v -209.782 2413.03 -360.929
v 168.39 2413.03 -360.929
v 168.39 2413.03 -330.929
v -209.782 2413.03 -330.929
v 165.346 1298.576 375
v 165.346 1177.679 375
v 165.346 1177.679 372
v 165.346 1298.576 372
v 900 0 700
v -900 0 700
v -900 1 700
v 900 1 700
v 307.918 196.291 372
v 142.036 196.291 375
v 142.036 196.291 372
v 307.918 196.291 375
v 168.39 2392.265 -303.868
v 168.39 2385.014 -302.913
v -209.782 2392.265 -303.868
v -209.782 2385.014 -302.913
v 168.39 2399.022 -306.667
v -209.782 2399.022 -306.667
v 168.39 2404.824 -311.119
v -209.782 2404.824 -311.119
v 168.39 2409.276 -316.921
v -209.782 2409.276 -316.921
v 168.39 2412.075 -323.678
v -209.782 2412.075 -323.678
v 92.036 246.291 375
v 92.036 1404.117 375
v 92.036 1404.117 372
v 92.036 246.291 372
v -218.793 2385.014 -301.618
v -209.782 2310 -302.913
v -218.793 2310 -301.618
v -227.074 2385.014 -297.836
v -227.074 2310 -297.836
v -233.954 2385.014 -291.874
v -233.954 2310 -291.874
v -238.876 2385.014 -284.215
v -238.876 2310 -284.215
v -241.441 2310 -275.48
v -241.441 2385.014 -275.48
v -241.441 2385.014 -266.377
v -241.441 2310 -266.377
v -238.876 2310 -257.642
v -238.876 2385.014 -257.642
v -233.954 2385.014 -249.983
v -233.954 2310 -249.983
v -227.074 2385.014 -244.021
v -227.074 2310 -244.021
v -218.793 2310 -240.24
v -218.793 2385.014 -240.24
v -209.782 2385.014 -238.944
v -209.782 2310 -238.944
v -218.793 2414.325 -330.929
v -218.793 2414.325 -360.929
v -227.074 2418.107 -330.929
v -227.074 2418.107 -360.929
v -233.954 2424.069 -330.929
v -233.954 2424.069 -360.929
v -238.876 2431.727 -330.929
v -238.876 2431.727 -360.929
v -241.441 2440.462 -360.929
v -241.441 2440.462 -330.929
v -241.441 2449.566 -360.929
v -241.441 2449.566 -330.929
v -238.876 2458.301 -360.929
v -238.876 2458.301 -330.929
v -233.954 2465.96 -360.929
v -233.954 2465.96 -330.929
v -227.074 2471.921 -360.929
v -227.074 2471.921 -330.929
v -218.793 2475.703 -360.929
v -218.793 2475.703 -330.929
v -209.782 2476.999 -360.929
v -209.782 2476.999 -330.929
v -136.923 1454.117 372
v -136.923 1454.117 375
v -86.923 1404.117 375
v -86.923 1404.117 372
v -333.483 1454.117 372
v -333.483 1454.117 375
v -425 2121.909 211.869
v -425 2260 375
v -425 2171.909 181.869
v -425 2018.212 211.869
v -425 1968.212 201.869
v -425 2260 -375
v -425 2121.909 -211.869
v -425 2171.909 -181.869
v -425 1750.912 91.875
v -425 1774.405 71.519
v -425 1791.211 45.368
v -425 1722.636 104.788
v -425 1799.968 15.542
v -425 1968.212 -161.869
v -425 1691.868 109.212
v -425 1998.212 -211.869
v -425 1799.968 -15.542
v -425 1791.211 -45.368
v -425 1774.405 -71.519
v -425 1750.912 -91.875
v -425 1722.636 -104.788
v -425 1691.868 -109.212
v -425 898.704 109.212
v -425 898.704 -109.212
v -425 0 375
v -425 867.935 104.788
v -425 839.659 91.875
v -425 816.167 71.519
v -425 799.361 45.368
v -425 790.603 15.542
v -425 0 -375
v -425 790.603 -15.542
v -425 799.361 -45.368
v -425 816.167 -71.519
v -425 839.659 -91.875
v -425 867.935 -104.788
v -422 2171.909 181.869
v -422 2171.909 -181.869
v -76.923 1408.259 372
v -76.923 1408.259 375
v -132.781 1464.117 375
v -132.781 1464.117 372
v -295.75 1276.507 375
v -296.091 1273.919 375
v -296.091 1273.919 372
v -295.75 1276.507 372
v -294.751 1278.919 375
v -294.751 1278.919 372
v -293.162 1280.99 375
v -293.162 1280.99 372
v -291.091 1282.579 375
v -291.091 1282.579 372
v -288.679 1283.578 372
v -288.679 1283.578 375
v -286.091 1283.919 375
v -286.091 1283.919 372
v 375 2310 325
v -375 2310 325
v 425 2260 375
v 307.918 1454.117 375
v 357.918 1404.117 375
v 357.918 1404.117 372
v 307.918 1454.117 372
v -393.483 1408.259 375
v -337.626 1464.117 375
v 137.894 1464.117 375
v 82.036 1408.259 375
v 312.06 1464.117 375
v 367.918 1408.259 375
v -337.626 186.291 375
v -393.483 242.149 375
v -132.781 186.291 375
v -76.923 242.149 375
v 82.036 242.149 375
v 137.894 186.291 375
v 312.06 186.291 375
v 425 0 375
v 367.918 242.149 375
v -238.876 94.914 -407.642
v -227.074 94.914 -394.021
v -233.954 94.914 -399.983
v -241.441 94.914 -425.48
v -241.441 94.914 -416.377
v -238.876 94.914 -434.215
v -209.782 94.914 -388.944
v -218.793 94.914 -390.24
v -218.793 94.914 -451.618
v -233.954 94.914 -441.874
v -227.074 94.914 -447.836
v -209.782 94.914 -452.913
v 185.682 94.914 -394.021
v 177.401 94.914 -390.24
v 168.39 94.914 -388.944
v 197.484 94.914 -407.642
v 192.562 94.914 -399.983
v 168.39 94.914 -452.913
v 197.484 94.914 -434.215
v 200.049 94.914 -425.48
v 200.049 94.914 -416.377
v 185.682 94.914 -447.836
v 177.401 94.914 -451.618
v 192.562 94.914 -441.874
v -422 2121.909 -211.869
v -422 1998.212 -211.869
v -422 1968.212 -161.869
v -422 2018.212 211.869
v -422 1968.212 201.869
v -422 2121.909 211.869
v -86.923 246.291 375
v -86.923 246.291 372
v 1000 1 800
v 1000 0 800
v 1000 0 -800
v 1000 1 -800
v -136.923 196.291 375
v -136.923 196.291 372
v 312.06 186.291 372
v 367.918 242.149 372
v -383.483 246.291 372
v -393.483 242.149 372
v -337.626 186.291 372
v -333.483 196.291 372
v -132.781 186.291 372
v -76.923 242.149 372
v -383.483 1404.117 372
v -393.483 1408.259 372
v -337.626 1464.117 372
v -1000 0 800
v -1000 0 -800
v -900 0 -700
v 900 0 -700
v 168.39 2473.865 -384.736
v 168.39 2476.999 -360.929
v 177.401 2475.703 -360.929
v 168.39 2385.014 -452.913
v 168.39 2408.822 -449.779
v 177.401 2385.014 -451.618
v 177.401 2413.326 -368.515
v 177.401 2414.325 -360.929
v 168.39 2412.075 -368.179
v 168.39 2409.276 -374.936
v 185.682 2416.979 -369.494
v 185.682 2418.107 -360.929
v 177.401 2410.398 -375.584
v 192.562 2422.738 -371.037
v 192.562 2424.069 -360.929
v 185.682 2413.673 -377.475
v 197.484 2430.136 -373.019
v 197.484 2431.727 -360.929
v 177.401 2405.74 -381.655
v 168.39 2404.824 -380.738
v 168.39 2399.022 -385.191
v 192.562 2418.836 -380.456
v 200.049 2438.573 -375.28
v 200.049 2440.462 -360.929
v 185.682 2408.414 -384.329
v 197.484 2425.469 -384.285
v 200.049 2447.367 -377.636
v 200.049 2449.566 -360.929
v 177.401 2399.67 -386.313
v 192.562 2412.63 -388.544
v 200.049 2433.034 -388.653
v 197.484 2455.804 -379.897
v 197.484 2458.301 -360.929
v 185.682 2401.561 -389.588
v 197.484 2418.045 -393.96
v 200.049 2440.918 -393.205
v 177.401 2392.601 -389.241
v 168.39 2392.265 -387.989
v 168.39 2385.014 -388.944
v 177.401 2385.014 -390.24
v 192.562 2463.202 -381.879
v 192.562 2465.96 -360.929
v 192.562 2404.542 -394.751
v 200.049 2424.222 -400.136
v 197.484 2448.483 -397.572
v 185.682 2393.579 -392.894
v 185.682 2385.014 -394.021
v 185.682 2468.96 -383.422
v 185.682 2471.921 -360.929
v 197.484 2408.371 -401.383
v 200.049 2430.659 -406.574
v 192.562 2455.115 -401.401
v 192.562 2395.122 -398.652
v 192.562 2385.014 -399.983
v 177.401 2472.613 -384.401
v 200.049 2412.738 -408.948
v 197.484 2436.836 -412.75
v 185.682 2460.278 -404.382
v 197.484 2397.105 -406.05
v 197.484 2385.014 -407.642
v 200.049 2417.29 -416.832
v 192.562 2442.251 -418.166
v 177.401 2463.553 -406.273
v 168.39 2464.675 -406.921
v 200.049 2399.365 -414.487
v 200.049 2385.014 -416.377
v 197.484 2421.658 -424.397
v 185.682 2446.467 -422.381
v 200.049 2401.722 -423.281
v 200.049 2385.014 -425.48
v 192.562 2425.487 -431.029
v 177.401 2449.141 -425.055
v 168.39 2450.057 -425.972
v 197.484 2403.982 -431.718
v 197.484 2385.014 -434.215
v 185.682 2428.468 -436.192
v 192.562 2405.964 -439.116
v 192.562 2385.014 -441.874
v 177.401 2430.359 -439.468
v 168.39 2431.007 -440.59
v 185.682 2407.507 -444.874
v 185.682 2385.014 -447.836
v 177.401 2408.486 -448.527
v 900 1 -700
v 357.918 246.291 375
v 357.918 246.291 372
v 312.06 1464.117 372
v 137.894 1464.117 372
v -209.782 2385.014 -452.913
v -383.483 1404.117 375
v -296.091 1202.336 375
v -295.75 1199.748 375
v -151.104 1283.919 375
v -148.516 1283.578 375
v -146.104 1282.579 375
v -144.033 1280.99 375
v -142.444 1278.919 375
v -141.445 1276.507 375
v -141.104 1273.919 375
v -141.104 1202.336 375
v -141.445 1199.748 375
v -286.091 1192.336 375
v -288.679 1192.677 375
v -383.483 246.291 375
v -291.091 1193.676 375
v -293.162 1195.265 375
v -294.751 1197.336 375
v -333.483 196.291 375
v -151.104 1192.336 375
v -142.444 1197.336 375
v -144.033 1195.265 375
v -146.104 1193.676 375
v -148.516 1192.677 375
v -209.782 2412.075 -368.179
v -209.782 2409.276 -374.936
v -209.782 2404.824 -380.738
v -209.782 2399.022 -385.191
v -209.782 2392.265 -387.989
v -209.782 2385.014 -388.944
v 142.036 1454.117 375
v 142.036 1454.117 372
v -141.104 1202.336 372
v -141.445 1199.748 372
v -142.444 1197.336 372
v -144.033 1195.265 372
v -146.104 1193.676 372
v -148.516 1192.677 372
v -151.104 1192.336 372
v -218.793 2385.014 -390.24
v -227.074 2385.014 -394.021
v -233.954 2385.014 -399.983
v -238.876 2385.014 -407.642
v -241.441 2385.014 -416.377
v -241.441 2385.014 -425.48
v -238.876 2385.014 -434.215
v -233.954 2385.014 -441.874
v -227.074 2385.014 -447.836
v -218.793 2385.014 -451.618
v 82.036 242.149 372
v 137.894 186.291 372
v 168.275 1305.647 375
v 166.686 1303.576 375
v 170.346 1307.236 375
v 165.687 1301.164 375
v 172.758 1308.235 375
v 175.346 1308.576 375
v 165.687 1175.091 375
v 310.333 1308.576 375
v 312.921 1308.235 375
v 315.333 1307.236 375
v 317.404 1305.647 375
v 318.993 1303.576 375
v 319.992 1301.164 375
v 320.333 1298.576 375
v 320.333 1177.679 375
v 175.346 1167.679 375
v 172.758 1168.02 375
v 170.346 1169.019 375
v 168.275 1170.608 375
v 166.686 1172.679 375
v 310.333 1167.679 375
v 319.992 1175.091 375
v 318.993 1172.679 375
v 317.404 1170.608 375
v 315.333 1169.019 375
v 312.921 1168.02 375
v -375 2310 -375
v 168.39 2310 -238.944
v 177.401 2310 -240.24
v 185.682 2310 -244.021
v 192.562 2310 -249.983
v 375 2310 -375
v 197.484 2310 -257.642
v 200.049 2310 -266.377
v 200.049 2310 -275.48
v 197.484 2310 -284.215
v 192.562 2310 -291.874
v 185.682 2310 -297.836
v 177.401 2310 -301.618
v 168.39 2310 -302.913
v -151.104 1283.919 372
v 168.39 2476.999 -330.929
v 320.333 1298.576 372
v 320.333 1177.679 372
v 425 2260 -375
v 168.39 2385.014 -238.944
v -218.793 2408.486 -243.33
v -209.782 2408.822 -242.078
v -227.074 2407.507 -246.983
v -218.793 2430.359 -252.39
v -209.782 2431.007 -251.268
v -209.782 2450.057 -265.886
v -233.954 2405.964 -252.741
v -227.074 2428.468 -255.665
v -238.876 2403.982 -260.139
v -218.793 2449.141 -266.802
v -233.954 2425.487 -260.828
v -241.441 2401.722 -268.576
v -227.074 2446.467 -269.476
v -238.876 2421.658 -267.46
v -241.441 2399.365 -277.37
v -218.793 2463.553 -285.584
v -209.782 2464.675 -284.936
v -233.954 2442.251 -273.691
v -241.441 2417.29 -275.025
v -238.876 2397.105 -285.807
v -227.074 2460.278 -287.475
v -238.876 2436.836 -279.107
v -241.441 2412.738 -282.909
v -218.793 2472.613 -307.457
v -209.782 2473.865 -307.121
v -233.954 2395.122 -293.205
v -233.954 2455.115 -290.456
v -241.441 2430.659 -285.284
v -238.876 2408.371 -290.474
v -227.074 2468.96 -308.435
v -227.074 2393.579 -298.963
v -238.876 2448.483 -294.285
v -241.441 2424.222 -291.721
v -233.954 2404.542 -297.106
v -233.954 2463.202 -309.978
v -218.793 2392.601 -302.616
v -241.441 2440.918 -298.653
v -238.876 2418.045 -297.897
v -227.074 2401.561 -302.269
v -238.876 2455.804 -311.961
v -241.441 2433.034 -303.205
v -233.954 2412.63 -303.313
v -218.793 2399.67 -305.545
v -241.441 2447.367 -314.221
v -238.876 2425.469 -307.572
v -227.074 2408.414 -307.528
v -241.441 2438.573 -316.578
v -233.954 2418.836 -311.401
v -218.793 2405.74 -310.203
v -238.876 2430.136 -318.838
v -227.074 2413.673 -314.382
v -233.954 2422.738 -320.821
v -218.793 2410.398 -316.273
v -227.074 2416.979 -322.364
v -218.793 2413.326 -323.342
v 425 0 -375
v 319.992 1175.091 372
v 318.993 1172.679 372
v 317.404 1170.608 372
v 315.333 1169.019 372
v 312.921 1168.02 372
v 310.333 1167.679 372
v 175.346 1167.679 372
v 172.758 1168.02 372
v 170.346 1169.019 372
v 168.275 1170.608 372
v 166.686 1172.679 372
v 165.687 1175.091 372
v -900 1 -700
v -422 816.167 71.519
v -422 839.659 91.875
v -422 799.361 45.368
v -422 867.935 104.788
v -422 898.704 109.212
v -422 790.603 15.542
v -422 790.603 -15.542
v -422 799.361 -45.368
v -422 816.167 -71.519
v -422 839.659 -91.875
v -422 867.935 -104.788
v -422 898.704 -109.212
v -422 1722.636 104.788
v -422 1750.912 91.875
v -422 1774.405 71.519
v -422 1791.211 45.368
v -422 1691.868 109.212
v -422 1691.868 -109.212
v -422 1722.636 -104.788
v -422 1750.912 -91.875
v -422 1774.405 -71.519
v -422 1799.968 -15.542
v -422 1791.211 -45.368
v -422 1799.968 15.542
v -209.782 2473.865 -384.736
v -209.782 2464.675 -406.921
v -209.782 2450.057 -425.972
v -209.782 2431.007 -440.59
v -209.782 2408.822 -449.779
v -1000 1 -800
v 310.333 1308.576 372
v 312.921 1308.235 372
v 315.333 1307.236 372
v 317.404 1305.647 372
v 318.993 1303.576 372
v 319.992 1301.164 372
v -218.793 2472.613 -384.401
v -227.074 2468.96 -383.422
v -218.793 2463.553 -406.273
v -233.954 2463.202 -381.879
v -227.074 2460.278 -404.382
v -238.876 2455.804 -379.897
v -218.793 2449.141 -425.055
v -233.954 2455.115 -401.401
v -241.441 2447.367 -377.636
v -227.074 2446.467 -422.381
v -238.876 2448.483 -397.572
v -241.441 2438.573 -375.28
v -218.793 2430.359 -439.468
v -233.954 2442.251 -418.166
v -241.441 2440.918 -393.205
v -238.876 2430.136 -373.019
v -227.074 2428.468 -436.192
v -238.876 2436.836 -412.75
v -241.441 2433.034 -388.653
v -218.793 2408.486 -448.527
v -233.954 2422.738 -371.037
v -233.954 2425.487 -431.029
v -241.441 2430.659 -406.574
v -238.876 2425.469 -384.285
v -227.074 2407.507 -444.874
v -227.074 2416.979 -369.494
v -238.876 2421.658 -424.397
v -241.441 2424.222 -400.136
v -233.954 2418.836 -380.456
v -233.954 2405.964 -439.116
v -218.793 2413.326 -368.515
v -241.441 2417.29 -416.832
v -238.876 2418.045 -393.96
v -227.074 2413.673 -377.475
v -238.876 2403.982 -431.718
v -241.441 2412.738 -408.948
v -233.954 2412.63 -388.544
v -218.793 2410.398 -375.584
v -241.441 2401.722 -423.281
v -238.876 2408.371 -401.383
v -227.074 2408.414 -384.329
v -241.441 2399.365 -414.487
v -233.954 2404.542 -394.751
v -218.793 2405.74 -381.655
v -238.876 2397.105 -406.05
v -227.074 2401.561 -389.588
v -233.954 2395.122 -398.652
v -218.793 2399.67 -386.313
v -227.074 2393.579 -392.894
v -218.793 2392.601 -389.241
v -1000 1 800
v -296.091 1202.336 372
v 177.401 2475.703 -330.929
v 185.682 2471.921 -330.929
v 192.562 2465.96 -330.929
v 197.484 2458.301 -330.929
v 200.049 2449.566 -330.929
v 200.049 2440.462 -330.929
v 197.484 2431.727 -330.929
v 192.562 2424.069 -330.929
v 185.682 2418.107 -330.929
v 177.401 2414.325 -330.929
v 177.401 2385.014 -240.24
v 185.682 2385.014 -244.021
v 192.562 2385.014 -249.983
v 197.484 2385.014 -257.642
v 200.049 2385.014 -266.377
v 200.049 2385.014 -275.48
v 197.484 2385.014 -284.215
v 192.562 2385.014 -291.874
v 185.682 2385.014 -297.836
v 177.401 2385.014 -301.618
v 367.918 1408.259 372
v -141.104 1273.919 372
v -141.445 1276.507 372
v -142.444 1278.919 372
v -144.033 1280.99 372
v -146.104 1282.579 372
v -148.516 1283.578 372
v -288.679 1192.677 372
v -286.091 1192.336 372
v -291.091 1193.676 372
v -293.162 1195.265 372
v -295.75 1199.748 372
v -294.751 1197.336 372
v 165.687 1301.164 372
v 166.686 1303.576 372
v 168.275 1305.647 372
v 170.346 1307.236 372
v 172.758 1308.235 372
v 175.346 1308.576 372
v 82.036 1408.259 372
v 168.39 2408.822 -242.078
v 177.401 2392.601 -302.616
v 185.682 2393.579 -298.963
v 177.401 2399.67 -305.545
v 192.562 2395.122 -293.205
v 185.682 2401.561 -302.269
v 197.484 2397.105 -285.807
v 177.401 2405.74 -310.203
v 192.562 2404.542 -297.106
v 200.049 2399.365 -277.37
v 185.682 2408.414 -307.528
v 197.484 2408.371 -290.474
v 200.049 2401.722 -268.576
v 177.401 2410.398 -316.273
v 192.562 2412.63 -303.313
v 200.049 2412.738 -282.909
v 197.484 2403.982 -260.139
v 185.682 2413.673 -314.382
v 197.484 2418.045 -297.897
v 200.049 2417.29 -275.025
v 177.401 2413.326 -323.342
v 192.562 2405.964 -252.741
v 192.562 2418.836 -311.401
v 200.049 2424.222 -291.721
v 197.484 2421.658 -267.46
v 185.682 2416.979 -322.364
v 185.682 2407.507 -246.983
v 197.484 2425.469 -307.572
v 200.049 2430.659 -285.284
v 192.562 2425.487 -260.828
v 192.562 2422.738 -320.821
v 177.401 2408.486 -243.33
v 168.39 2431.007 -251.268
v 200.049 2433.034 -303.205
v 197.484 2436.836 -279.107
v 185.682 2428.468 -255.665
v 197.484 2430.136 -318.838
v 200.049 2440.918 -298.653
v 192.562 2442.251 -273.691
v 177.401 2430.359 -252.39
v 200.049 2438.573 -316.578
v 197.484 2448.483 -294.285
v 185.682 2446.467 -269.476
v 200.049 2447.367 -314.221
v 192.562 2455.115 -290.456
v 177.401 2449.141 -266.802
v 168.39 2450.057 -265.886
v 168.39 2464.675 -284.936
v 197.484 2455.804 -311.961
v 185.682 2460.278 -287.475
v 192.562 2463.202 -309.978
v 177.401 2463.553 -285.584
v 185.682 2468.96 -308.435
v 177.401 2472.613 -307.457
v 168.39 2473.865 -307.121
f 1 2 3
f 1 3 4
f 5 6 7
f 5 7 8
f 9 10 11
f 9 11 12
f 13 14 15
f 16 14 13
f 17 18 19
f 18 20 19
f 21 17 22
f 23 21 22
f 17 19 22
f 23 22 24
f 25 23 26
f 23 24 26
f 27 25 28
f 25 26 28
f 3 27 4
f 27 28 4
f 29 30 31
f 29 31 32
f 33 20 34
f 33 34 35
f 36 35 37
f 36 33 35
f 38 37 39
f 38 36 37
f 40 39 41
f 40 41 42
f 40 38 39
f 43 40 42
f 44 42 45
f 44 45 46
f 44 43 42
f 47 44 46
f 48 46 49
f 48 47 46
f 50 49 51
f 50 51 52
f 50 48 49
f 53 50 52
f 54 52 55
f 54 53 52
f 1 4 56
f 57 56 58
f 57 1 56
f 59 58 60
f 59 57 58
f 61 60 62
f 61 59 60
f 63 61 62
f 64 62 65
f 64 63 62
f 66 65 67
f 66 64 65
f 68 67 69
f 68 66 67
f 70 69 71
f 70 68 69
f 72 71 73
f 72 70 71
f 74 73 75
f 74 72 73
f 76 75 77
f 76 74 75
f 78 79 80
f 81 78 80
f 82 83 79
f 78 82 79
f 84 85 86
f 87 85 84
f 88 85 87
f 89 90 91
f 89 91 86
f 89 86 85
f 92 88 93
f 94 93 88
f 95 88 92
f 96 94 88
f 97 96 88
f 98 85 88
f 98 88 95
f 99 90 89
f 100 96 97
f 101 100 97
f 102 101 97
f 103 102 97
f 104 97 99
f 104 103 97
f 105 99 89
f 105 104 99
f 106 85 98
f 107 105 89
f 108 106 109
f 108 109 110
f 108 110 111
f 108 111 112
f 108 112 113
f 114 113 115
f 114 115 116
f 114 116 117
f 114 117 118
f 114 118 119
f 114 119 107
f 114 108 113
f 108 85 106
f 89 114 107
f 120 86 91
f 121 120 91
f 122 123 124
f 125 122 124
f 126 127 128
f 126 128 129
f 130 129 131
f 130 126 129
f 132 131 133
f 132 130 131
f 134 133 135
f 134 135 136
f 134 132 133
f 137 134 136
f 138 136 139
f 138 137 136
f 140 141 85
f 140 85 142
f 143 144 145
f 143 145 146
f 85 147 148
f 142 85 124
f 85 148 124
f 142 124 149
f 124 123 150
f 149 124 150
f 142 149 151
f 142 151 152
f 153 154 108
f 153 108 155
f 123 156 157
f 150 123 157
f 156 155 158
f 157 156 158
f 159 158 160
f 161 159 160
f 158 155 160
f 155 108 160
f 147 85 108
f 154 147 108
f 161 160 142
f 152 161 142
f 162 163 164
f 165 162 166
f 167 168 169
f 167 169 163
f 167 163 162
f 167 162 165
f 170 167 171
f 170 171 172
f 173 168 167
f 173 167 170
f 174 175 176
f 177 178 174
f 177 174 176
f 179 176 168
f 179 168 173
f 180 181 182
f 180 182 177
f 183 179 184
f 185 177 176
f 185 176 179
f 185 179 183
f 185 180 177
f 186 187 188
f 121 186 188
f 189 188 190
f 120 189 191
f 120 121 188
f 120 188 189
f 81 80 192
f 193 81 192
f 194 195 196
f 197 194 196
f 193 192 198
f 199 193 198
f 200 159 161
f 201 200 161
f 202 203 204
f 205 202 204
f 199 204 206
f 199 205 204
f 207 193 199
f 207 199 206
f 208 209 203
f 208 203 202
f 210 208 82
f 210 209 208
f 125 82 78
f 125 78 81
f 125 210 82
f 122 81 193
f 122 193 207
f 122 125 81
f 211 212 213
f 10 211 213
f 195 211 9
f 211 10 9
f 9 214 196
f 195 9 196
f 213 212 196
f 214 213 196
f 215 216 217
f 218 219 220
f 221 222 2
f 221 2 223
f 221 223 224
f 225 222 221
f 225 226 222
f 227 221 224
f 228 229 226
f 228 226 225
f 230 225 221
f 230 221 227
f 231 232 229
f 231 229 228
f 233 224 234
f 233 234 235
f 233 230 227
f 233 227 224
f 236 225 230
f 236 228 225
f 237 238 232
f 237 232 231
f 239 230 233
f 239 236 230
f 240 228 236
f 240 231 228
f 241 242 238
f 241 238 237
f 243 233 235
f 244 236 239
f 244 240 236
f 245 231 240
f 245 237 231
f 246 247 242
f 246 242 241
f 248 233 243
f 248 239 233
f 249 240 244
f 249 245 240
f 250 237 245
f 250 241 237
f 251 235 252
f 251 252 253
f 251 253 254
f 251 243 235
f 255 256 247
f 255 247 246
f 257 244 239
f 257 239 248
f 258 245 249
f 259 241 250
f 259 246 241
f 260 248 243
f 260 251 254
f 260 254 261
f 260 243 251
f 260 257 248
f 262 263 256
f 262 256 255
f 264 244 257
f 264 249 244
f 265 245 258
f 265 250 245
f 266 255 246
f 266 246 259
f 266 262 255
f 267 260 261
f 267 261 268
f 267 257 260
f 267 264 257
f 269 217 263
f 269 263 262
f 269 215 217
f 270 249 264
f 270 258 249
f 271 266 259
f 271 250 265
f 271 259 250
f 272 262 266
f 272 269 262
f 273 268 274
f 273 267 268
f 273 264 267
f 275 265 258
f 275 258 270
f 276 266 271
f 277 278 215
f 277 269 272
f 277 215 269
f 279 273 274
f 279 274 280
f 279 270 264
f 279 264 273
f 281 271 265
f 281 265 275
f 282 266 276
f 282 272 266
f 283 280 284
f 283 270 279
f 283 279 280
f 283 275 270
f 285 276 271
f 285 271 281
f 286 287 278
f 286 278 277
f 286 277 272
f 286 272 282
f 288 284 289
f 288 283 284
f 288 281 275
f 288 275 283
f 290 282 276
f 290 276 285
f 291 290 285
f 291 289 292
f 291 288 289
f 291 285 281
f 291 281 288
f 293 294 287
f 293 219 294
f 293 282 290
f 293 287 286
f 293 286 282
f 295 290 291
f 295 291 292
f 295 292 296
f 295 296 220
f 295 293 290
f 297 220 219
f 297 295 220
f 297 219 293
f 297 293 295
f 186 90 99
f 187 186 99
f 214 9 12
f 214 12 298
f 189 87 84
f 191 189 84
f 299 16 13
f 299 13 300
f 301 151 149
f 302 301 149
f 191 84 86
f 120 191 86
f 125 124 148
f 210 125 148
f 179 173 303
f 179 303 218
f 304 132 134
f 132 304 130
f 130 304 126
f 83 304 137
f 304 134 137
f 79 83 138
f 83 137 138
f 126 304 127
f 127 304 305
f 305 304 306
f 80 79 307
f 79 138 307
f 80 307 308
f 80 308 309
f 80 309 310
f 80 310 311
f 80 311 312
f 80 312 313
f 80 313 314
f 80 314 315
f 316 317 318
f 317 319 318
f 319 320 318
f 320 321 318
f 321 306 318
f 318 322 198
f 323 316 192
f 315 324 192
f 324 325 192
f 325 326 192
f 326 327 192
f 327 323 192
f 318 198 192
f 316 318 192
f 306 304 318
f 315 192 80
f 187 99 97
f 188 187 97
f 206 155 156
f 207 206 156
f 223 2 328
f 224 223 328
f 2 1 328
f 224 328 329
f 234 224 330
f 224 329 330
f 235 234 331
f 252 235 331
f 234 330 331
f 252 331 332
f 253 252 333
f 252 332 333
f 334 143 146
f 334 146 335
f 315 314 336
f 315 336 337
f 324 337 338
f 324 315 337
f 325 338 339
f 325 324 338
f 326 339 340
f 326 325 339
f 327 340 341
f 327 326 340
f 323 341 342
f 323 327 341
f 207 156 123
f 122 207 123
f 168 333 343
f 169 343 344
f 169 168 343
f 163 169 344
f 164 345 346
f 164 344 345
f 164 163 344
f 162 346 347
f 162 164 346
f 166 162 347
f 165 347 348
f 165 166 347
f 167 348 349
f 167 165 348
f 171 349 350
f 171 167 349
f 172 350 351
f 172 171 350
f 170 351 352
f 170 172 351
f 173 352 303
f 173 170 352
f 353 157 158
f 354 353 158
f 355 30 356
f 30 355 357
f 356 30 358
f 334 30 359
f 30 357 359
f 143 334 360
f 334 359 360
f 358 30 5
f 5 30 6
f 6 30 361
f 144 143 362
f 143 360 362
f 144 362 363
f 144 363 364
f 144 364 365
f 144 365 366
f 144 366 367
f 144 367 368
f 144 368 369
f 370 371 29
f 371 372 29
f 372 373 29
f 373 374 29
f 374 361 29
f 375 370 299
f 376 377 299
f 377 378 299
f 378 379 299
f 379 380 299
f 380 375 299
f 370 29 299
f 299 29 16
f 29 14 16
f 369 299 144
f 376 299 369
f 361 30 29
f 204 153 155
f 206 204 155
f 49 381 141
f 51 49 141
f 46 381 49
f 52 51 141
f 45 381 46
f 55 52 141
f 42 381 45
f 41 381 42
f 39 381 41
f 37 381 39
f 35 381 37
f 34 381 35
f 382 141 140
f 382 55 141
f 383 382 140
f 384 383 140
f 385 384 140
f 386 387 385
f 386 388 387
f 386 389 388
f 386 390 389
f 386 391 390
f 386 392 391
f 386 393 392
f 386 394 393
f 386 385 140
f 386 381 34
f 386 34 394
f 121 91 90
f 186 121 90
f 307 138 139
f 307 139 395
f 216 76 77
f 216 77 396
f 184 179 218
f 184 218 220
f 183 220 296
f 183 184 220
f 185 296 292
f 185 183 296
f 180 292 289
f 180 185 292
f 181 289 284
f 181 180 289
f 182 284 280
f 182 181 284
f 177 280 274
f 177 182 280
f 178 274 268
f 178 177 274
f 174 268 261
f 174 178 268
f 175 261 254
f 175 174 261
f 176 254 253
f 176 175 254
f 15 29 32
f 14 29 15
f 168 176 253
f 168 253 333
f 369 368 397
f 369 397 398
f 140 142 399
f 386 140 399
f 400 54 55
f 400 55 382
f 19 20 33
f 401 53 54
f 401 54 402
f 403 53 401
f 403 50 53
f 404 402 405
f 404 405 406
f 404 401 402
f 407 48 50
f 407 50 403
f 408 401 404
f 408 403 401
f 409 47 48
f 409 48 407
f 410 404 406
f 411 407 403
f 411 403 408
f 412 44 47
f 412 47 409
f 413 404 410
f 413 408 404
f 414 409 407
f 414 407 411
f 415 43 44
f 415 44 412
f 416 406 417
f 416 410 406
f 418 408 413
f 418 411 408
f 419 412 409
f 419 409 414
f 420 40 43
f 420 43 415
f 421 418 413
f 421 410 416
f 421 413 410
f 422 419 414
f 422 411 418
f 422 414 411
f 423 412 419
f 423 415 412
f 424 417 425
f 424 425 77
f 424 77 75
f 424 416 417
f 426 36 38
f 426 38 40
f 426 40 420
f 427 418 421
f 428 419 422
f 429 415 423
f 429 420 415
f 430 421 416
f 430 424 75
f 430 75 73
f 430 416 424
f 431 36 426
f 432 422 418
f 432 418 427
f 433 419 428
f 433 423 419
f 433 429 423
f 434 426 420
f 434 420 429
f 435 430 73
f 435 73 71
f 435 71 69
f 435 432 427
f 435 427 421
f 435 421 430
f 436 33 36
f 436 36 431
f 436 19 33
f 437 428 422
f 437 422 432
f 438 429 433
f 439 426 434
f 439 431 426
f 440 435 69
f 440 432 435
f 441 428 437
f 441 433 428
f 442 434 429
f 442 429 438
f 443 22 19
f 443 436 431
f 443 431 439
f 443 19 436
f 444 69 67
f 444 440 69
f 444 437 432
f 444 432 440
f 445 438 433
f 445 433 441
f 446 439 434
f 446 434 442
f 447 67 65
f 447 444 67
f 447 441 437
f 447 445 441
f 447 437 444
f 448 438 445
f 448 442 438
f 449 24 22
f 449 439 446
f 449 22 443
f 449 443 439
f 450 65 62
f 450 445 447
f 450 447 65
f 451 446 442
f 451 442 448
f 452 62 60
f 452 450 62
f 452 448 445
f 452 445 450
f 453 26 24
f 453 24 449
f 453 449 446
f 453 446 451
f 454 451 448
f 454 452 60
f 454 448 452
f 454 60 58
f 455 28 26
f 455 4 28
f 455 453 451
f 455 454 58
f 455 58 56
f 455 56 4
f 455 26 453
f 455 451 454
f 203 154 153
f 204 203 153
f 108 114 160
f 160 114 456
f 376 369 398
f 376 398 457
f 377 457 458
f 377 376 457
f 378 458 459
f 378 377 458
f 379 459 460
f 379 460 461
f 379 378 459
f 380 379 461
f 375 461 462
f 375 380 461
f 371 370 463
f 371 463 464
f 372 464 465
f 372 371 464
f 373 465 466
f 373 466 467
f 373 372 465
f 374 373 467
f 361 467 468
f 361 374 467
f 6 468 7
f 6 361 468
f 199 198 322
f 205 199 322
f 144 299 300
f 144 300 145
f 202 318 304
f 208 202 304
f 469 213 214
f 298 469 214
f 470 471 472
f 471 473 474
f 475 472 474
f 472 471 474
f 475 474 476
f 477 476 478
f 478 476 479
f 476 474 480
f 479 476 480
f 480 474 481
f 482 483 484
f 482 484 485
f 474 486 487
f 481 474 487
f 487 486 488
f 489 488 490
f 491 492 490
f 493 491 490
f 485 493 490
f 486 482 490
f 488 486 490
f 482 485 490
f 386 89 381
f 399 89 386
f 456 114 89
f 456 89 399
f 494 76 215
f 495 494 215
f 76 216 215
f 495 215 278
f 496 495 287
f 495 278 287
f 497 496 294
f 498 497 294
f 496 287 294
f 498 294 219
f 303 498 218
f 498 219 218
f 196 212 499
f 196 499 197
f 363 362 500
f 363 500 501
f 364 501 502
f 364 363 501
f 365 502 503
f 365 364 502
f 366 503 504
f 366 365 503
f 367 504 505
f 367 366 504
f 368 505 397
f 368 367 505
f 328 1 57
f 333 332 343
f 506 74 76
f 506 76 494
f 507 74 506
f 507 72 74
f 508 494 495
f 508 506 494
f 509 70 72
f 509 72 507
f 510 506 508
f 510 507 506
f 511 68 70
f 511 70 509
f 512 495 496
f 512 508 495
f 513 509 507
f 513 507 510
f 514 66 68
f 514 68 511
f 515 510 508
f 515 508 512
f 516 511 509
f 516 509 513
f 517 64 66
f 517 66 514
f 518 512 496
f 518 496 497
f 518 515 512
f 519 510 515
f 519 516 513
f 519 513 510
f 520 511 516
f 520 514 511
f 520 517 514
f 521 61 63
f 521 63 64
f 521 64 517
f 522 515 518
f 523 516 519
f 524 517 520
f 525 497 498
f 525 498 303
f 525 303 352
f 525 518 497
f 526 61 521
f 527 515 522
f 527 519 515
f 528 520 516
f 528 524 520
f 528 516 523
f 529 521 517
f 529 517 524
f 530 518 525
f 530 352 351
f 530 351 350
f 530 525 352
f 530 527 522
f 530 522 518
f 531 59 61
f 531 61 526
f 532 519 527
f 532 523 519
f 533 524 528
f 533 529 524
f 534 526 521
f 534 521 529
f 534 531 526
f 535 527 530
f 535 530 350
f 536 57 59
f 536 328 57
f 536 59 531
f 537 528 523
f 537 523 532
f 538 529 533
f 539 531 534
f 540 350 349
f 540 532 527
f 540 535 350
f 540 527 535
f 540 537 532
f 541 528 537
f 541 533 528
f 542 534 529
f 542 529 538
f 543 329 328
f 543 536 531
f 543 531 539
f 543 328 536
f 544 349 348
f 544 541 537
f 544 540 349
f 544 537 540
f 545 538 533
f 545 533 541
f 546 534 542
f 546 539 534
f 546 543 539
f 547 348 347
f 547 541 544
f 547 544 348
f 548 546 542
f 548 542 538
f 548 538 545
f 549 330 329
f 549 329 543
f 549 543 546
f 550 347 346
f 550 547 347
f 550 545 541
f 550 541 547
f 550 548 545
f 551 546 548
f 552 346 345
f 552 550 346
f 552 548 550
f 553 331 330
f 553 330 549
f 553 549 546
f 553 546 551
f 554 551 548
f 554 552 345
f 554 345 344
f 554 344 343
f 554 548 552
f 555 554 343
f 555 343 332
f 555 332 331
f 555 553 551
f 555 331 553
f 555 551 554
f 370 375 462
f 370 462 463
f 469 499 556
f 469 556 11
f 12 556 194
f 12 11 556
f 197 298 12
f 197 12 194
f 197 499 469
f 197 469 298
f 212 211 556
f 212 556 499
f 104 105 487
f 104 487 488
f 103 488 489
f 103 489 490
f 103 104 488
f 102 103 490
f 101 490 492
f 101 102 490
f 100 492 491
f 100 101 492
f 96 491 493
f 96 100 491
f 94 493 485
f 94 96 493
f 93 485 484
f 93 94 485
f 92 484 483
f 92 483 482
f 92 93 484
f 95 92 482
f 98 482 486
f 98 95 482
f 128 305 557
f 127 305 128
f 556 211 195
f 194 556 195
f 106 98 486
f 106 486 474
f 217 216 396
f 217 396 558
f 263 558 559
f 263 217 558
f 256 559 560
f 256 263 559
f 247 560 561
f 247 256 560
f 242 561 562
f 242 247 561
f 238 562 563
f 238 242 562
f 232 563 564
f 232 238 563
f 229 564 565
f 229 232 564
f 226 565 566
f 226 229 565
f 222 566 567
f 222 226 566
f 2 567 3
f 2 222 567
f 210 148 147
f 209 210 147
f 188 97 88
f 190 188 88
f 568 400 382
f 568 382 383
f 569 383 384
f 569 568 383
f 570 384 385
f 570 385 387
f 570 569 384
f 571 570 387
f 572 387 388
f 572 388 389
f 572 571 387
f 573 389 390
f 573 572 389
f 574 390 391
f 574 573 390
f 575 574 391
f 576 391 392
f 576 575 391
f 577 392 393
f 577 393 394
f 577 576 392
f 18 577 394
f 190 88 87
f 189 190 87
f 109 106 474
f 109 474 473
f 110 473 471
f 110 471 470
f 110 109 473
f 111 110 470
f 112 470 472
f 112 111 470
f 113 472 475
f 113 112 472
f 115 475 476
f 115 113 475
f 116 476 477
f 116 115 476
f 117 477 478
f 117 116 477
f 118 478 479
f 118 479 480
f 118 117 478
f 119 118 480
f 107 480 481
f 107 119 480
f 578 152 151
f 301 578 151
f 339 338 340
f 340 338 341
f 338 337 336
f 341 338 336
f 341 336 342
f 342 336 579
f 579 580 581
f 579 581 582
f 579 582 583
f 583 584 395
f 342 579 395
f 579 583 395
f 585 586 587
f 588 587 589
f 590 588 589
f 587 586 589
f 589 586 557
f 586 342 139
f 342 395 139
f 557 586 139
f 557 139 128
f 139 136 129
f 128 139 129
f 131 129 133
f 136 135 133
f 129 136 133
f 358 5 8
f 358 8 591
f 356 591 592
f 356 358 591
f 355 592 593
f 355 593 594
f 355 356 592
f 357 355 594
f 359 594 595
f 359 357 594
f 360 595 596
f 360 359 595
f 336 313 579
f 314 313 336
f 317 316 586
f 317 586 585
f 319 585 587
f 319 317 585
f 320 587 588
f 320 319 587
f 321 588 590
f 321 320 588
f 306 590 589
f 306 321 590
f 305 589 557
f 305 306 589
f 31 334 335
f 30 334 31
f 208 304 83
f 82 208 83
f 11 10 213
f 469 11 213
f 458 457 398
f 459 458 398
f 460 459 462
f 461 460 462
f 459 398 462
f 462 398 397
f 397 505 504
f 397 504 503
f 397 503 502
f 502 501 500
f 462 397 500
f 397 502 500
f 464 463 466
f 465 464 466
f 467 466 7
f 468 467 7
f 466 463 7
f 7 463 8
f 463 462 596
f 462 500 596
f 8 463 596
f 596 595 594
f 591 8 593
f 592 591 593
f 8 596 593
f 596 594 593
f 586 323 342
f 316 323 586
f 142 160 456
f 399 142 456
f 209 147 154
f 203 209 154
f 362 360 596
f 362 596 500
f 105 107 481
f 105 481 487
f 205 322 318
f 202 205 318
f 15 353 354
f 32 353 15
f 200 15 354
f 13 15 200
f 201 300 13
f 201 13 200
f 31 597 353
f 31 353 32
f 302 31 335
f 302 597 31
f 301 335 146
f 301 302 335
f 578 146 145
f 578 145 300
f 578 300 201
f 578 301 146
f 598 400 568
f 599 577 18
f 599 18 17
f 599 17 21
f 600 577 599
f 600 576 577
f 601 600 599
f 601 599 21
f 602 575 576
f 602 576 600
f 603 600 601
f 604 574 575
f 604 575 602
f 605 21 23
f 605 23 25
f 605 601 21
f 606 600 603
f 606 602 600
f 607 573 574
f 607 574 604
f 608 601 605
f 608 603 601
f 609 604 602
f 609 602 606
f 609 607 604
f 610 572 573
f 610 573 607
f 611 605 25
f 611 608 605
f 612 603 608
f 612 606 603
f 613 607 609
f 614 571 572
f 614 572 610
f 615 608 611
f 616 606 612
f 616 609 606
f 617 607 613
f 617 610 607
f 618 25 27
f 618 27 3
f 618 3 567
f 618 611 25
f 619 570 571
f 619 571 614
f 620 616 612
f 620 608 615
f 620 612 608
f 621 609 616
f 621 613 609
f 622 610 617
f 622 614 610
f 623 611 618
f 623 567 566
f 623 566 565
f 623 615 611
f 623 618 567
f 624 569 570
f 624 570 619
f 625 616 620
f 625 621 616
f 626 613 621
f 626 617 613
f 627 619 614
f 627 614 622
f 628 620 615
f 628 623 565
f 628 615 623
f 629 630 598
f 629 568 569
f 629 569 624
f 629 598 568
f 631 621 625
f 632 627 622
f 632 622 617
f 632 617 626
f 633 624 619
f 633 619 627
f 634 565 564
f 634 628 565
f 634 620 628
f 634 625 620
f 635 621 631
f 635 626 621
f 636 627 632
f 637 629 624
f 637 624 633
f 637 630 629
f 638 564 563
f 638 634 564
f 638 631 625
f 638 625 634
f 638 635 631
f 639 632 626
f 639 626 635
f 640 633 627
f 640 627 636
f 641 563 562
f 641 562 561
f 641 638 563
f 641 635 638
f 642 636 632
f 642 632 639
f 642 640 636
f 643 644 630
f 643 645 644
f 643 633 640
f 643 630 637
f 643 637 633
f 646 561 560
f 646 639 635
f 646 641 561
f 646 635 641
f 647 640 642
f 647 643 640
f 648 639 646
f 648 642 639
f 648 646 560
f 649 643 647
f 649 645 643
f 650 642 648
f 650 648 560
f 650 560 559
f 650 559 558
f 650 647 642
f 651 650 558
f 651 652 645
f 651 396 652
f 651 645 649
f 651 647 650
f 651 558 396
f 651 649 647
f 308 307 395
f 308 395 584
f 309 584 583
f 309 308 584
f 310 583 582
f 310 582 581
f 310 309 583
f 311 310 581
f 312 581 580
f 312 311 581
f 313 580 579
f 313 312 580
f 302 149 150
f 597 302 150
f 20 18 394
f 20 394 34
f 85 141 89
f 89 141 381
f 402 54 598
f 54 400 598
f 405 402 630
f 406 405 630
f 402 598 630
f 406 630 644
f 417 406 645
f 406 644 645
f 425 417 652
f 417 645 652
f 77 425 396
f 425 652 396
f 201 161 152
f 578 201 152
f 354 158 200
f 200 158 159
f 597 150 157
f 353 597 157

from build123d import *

# Parameters (mm, degrees)
CROQUIS1_W              = 850
CROQUIS1_H              = 750
SALIENTE_EXTRUIR1_DEPTH = 2310
CORTAR_EXTRUIR1_DEPTH   = 3
CORTAR_EXTRUIR2_DEPTH   = 3
CORTAR_EXTRUIR3_DEPTH   = 3
CORTAR_EXTRUIR4_DEPTH   = 3
CHAFL_N1_SIZE           = 50
CROQUIS7_W              = 2000
CROQUIS7_H              = 1600
CROQUIS7_W_2            = 1800
CROQUIS7_H_2            = 1400
SALIENTE_EXTRUIR2_DEPTH = 1


with BuildPart() as part:
    # Croquis1 → Saliente-Extruir1 (new body)
    with BuildSketch(Plane(origin=(0, 0, 0), x_dir=(1, 0, 0), z_dir=(0, 1, 0))):
        Rectangle(CROQUIS1_W, CROQUIS1_H)
    extrude(amount=SALIENTE_EXTRUIR1_DEPTH)

    # Croquis2 → Cortar-Extruir1 (cut)
    # profile 1 of 2: a face of its own
    with BuildSketch(Plane.XY.offset(375)):
        Polygon((-393.483471659, 1408.259243518), (-393.483471659, 242.149185229), (-337.625607283, 186.291320853), (-132.780784619, 186.291320853), (-76.922920243, 242.149185229), (-76.922920243, 1408.259243518), (-132.780784619, 1464.117107894), (-337.625607283, 1464.117107894), align=None)
        Polygon((-383.483471659, 1404.117107894), (-333.483471659, 1454.117107894), (-136.922920243, 1454.117107894), (-86.922920243, 1404.117107894), (-86.922920243, 246.291320853), (-136.922920243, 196.291320853), (-333.483471659, 196.291320853), (-383.483471659, 246.291320853), align=None, mode=Mode.SUBTRACT)
    # profile 2 of 2: a face of its own
    with BuildSketch(Plane.XY.offset(375)):
        Polygon((82.036033198, 1408.259243518), (82.036033198, 242.149185229), (137.893897574, 186.291320853), (312.060042505, 186.291320853), (367.917906882, 242.149185229), (367.917906882, 1408.259243518), (312.060042505, 1464.117107894), (137.893897574, 1464.117107894), align=None)
        Polygon((307.917906882, 1454.117107894), (142.036033198, 1454.117107894), (92.036033198, 1404.117107894), (92.036033198, 246.291320853), (142.036033198, 196.291320853), (307.917906882, 196.291320853), (357.917906882, 246.291320853), (357.917906882, 1404.117107894), align=None, mode=Mode.SUBTRACT)
    extrude(amount=-CORTAR_EXTRUIR1_DEPTH, mode=Mode.SUBTRACT)

    # Croquis3 → Cortar-Extruir2 (cut)
    with BuildSketch(Plane.XY.offset(375)):
        with BuildLine():
            Line((-286.091039819, 1283.918898277), (-151.104405159, 1283.918898277))
            ThreePointArc((-151.104405159, 1283.918898277), (-144.033337347, 1280.989966089), (-141.104405159, 1273.918898277))
            Line((-141.104405159, 1273.918898277), (-141.104405159, 1202.335886887))
            ThreePointArc((-141.104405159, 1202.335886887), (-144.033337347, 1195.264819075), (-151.104405159, 1192.335886887))
            Line((-151.104405159, 1192.335886887), (-286.091039819, 1192.335886887))
            ThreePointArc((-286.091039819, 1192.335886887), (-293.162107631, 1195.264819075), (-296.091039819, 1202.335886887))
            Line((-296.091039819, 1202.335886887), (-296.091039819, 1273.918898277))
            ThreePointArc((-296.091039819, 1273.918898277), (-293.162107631, 1280.989966089), (-286.091039819, 1283.918898277))
        make_face()
        with BuildLine():
            Line((175.346440647, 1308.575862882), (310.333075308, 1308.575862882))
            ThreePointArc((310.333075308, 1308.575862882), (317.40414312, 1305.646930694), (320.333075308, 1298.575862882))
            Line((320.333075308, 1298.575862882), (320.333075308, 1177.678922282))
            ThreePointArc((320.333075308, 1177.678922282), (317.40414312, 1170.60785447), (310.333075308, 1167.678922282))
            Line((310.333075308, 1167.678922282), (175.346440647, 1167.678922282))
            ThreePointArc((175.346440647, 1167.678922282), (168.275372835, 1170.60785447), (165.346440647, 1177.678922282))
            Line((165.346440647, 1177.678922282), (165.346440647, 1298.575862882))
            ThreePointArc((165.346440647, 1298.575862882), (168.275372835, 1305.646930694), (175.346440647, 1308.575862882))
        make_face()
    extrude(amount=-CORTAR_EXTRUIR2_DEPTH, mode=Mode.SUBTRACT)

    # Croquis4 → Cortar-Extruir3 (cut)
    with BuildSketch(Plane.ZY.offset(425)):
        with BuildLine():
            Line((109.212006175, 1691.86792005), (109.212006175, 898.703809809))
            ThreePointArc((109.212006175, 898.703809809), (0, 789.491803634), (-109.212006175, 898.703809809))
            Line((-109.212006175, 898.703809809), (-109.212006175, 1691.86792005))
            ThreePointArc((-109.212006175, 1691.86792005), (0, 1801.079926225), (109.212006175, 1691.86792005))
        make_face()
    extrude(amount=-CORTAR_EXTRUIR3_DEPTH, mode=Mode.SUBTRACT)

    # Croquis5 → Cortar-Extruir4 (cut)
    with BuildSketch(Plane.ZY.offset(425)):
        Polygon((201.868660443, 1968.212358458), (211.868660443, 2018.212358458), (211.868660443, 2121.90902677), (181.868660443, 2171.90902677), (-181.868660443, 2171.90902677), (-211.868660443, 2121.90902677), (-211.868660443, 1998.212358458), (-161.868660443, 1968.212358458), align=None)
    extrude(amount=-CORTAR_EXTRUIR4_DEPTH, mode=Mode.SUBTRACT)

    # Barrer1: sweep along a curve in space
    with BuildLine() as barrer1_path:
        Line((-20.695933391, 2310, -270.928582575), (-20.695933391, 2385.014260788, -270.928582575))
        ThreePointArc((-20.695933391, 2385.014260788, -270.928582575), (-20.695933391, 2427.440667659, -288.502175703), (-20.695933391, 2445.014260788, -330.928582575))
        Line((-20.695933391, 2445.014260788, -330.928582575), (-20.695933391, 2445.014260788, -360.928582575))
        ThreePointArc((-20.695933391, 2445.014260788, -360.928582575), (-20.695933391, 2427.440667659, -403.354989446), (-20.695933391, 2385.014260788, -420.928582575))
        Line((-20.695933391, 2385.014260788, -420.928582575), (-20.695933391, 94.913979235, -420.928582575))
    # Croquis6 → Barrer1 (sweep)
    with BuildSketch(Plane(origin=(0, 2310, 0), x_dir=(1, 0, 0), z_dir=(0, 1, 0))):
        with BuildLine():
            Line((168.389639864, 238.943958243), (-209.781506646, 238.943958243))
            ThreePointArc((-209.781506646, 238.943958243), (-241.766130978, 270.928582575), (-209.781506646, 302.913206906))
            Line((-209.781506646, 302.913206906), (168.389639864, 302.913206906))
            ThreePointArc((168.389639864, 302.913206906), (200.374264196, 270.928582575), (168.389639864, 238.943958243))
        make_face()
    sweep(path=barrer1_path.line)

    # Chaflán1
    chafl_n1_edges = [part.edges().sort_by_distance(p)[0] for p in [
        (-425, 2310, 0),
        (0, 2310, 375),
        (425, 2310, 0),
    ]]
    chamfer(chafl_n1_edges, length=CHAFL_N1_SIZE)


with BuildPart() as body_2:
    # Croquis7 → Saliente-Extruir2 (new body)
    with BuildSketch(Plane(origin=(0, 0, 0), x_dir=(1, 0, 0), z_dir=(0, 1, 0))):
        Rectangle(CROQUIS7_W, CROQUIS7_H)
        Rectangle(CROQUIS7_W_2, CROQUIS7_H_2, mode=Mode.SUBTRACT)
    extrude(amount=SALIENTE_EXTRUIR2_DEPTH)


solid = Compound([part.part, body_2.part])
